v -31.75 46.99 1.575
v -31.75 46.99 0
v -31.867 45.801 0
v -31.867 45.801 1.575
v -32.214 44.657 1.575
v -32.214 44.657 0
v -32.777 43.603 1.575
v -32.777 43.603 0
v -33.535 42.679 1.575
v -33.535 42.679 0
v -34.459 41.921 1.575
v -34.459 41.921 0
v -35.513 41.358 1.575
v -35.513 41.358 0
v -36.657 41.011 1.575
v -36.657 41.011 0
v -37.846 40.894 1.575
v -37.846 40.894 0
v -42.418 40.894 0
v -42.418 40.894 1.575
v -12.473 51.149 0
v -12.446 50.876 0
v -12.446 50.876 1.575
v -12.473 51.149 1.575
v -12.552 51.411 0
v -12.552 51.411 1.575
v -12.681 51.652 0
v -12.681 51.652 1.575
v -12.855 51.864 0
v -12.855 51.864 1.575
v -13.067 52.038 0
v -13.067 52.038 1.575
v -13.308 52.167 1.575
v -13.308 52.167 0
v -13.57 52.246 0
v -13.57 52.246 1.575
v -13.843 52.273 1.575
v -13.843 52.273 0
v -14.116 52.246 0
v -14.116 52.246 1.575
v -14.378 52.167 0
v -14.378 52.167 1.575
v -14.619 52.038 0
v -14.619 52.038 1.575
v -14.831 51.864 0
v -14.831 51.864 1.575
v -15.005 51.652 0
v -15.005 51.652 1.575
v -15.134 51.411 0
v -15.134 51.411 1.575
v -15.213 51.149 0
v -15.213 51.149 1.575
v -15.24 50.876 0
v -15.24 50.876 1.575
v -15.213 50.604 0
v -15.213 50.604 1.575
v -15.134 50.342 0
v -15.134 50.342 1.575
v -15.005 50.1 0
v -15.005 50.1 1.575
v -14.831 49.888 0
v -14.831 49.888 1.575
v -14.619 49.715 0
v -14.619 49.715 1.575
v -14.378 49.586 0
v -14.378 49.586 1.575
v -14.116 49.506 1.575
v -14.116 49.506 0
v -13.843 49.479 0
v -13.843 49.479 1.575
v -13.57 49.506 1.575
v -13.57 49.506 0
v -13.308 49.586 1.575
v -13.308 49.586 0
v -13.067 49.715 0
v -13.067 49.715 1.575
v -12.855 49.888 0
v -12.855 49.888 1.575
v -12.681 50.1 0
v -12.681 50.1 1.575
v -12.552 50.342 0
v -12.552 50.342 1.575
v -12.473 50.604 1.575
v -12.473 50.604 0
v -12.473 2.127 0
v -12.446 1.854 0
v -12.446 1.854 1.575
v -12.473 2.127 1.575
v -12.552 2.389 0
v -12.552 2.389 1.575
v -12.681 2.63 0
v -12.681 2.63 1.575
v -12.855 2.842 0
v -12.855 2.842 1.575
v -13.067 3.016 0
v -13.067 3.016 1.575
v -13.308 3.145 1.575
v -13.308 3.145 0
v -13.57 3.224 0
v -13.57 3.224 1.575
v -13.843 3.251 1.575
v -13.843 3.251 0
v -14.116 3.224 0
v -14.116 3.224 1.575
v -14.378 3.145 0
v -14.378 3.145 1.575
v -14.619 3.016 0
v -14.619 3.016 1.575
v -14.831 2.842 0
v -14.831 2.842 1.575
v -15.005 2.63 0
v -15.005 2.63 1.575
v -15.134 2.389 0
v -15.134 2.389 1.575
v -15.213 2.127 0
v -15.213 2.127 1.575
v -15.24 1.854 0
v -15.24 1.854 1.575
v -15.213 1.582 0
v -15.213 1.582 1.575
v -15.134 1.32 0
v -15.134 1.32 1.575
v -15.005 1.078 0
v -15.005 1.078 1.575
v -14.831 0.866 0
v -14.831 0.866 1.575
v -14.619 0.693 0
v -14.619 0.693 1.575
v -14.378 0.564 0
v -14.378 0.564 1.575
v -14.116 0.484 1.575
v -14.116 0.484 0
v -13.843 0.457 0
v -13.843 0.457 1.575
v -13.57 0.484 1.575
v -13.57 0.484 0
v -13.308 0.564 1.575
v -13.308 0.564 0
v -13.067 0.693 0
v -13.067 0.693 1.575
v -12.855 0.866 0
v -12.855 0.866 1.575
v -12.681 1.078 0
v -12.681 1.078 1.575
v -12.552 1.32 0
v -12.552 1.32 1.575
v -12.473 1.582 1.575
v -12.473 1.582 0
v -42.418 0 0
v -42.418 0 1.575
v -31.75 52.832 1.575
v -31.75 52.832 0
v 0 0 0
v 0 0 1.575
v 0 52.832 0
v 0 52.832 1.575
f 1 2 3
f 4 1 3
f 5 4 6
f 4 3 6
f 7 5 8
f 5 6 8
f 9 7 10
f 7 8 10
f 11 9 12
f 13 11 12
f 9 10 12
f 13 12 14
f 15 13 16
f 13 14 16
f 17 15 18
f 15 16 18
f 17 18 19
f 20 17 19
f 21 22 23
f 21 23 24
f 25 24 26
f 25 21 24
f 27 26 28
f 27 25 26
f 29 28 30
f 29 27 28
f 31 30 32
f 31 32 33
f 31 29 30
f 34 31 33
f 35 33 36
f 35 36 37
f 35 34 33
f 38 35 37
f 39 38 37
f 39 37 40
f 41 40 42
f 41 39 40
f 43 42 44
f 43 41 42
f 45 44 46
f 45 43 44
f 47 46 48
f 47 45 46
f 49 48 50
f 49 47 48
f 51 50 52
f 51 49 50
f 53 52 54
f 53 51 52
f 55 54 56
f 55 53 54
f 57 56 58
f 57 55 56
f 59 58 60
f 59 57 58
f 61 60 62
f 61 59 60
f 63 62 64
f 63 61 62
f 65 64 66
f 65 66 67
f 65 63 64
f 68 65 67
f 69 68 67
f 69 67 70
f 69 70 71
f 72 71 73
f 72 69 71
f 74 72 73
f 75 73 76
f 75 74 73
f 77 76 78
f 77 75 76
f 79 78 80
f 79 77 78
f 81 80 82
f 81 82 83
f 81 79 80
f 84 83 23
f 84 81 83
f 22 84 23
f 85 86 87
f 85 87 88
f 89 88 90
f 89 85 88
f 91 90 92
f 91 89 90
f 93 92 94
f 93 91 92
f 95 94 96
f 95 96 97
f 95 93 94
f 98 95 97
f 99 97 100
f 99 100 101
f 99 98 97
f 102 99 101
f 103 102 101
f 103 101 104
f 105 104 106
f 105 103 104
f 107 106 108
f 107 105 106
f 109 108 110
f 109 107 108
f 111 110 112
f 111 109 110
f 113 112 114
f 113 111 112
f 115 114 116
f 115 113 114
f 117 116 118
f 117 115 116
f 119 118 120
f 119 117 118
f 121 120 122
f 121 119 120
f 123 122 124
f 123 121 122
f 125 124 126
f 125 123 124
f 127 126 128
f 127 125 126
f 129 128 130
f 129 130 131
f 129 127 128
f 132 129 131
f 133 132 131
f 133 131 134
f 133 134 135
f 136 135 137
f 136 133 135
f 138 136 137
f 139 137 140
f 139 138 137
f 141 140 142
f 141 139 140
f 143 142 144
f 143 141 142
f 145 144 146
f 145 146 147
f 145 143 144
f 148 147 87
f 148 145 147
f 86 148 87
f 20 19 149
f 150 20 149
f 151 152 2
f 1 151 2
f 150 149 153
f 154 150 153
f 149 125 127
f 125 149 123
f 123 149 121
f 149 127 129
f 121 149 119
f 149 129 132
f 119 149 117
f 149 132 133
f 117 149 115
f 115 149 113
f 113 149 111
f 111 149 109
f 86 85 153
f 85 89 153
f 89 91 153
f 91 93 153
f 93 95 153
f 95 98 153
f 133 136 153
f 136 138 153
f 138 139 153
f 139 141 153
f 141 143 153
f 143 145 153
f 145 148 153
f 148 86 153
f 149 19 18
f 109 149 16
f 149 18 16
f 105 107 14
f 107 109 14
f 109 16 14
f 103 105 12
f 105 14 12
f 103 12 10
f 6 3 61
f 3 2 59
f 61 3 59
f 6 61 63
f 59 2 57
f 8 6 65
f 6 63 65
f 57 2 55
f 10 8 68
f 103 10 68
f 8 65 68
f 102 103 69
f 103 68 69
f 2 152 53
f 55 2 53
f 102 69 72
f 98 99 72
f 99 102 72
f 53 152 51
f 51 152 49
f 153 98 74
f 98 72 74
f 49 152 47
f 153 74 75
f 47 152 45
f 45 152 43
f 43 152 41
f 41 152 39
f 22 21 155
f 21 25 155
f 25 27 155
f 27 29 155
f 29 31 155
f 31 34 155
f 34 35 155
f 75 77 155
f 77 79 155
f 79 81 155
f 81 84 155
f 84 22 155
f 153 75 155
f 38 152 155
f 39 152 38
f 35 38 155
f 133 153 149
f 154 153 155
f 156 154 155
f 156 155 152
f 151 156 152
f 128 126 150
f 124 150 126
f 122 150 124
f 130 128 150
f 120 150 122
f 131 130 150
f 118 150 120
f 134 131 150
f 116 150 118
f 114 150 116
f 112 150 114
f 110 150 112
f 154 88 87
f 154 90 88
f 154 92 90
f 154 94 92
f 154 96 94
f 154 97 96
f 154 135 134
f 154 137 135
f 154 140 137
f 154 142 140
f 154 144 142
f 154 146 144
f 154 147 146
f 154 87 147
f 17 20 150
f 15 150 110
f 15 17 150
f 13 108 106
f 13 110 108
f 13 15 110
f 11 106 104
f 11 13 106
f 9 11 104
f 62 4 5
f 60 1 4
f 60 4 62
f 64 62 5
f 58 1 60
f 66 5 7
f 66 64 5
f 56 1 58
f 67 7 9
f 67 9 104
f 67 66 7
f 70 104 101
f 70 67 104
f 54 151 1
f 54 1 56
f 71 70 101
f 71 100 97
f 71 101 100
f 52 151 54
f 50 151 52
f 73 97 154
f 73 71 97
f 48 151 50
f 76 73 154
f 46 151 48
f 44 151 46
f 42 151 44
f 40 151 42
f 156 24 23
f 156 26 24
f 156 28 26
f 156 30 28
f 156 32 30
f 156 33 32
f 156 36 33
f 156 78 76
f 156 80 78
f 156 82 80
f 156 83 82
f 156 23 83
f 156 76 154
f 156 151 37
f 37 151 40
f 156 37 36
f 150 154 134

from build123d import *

# Parameters (mm, degrees)
SKETCH1_R           = 1.397
BOSS_EXTRUDE1_DEPTH = 1.5748


with BuildPart() as part:
    # Sketch1 → Boss-Extrude1 (new body)
    with BuildSketch(Plane.XY):
        with BuildLine():
            Line((0, 0), (0, 52.832))
            Line((0, 52.832), (-31.75, 52.832))
            Line((-31.75, 52.832), (-31.75, 46.99))
            ThreePointArc((-31.75, 46.99), (-33.535477062, 42.679477062), (-37.846, 40.894))
            Line((-37.846, 40.894), (-42.418, 40.894))
            Line((-42.418, 40.894), (-42.418, 0))
            Line((-42.418, 0), (0, 0))
        make_face()
        with Locations((-13.843, 50.8762)):
            Circle(SKETCH1_R, mode=Mode.SUBTRACT)
        with Locations((-13.843, 1.8542)):
            Circle(SKETCH1_R, mode=Mode.SUBTRACT)
    extrude(amount=BOSS_EXTRUDE1_DEPTH)


solid = part.part
